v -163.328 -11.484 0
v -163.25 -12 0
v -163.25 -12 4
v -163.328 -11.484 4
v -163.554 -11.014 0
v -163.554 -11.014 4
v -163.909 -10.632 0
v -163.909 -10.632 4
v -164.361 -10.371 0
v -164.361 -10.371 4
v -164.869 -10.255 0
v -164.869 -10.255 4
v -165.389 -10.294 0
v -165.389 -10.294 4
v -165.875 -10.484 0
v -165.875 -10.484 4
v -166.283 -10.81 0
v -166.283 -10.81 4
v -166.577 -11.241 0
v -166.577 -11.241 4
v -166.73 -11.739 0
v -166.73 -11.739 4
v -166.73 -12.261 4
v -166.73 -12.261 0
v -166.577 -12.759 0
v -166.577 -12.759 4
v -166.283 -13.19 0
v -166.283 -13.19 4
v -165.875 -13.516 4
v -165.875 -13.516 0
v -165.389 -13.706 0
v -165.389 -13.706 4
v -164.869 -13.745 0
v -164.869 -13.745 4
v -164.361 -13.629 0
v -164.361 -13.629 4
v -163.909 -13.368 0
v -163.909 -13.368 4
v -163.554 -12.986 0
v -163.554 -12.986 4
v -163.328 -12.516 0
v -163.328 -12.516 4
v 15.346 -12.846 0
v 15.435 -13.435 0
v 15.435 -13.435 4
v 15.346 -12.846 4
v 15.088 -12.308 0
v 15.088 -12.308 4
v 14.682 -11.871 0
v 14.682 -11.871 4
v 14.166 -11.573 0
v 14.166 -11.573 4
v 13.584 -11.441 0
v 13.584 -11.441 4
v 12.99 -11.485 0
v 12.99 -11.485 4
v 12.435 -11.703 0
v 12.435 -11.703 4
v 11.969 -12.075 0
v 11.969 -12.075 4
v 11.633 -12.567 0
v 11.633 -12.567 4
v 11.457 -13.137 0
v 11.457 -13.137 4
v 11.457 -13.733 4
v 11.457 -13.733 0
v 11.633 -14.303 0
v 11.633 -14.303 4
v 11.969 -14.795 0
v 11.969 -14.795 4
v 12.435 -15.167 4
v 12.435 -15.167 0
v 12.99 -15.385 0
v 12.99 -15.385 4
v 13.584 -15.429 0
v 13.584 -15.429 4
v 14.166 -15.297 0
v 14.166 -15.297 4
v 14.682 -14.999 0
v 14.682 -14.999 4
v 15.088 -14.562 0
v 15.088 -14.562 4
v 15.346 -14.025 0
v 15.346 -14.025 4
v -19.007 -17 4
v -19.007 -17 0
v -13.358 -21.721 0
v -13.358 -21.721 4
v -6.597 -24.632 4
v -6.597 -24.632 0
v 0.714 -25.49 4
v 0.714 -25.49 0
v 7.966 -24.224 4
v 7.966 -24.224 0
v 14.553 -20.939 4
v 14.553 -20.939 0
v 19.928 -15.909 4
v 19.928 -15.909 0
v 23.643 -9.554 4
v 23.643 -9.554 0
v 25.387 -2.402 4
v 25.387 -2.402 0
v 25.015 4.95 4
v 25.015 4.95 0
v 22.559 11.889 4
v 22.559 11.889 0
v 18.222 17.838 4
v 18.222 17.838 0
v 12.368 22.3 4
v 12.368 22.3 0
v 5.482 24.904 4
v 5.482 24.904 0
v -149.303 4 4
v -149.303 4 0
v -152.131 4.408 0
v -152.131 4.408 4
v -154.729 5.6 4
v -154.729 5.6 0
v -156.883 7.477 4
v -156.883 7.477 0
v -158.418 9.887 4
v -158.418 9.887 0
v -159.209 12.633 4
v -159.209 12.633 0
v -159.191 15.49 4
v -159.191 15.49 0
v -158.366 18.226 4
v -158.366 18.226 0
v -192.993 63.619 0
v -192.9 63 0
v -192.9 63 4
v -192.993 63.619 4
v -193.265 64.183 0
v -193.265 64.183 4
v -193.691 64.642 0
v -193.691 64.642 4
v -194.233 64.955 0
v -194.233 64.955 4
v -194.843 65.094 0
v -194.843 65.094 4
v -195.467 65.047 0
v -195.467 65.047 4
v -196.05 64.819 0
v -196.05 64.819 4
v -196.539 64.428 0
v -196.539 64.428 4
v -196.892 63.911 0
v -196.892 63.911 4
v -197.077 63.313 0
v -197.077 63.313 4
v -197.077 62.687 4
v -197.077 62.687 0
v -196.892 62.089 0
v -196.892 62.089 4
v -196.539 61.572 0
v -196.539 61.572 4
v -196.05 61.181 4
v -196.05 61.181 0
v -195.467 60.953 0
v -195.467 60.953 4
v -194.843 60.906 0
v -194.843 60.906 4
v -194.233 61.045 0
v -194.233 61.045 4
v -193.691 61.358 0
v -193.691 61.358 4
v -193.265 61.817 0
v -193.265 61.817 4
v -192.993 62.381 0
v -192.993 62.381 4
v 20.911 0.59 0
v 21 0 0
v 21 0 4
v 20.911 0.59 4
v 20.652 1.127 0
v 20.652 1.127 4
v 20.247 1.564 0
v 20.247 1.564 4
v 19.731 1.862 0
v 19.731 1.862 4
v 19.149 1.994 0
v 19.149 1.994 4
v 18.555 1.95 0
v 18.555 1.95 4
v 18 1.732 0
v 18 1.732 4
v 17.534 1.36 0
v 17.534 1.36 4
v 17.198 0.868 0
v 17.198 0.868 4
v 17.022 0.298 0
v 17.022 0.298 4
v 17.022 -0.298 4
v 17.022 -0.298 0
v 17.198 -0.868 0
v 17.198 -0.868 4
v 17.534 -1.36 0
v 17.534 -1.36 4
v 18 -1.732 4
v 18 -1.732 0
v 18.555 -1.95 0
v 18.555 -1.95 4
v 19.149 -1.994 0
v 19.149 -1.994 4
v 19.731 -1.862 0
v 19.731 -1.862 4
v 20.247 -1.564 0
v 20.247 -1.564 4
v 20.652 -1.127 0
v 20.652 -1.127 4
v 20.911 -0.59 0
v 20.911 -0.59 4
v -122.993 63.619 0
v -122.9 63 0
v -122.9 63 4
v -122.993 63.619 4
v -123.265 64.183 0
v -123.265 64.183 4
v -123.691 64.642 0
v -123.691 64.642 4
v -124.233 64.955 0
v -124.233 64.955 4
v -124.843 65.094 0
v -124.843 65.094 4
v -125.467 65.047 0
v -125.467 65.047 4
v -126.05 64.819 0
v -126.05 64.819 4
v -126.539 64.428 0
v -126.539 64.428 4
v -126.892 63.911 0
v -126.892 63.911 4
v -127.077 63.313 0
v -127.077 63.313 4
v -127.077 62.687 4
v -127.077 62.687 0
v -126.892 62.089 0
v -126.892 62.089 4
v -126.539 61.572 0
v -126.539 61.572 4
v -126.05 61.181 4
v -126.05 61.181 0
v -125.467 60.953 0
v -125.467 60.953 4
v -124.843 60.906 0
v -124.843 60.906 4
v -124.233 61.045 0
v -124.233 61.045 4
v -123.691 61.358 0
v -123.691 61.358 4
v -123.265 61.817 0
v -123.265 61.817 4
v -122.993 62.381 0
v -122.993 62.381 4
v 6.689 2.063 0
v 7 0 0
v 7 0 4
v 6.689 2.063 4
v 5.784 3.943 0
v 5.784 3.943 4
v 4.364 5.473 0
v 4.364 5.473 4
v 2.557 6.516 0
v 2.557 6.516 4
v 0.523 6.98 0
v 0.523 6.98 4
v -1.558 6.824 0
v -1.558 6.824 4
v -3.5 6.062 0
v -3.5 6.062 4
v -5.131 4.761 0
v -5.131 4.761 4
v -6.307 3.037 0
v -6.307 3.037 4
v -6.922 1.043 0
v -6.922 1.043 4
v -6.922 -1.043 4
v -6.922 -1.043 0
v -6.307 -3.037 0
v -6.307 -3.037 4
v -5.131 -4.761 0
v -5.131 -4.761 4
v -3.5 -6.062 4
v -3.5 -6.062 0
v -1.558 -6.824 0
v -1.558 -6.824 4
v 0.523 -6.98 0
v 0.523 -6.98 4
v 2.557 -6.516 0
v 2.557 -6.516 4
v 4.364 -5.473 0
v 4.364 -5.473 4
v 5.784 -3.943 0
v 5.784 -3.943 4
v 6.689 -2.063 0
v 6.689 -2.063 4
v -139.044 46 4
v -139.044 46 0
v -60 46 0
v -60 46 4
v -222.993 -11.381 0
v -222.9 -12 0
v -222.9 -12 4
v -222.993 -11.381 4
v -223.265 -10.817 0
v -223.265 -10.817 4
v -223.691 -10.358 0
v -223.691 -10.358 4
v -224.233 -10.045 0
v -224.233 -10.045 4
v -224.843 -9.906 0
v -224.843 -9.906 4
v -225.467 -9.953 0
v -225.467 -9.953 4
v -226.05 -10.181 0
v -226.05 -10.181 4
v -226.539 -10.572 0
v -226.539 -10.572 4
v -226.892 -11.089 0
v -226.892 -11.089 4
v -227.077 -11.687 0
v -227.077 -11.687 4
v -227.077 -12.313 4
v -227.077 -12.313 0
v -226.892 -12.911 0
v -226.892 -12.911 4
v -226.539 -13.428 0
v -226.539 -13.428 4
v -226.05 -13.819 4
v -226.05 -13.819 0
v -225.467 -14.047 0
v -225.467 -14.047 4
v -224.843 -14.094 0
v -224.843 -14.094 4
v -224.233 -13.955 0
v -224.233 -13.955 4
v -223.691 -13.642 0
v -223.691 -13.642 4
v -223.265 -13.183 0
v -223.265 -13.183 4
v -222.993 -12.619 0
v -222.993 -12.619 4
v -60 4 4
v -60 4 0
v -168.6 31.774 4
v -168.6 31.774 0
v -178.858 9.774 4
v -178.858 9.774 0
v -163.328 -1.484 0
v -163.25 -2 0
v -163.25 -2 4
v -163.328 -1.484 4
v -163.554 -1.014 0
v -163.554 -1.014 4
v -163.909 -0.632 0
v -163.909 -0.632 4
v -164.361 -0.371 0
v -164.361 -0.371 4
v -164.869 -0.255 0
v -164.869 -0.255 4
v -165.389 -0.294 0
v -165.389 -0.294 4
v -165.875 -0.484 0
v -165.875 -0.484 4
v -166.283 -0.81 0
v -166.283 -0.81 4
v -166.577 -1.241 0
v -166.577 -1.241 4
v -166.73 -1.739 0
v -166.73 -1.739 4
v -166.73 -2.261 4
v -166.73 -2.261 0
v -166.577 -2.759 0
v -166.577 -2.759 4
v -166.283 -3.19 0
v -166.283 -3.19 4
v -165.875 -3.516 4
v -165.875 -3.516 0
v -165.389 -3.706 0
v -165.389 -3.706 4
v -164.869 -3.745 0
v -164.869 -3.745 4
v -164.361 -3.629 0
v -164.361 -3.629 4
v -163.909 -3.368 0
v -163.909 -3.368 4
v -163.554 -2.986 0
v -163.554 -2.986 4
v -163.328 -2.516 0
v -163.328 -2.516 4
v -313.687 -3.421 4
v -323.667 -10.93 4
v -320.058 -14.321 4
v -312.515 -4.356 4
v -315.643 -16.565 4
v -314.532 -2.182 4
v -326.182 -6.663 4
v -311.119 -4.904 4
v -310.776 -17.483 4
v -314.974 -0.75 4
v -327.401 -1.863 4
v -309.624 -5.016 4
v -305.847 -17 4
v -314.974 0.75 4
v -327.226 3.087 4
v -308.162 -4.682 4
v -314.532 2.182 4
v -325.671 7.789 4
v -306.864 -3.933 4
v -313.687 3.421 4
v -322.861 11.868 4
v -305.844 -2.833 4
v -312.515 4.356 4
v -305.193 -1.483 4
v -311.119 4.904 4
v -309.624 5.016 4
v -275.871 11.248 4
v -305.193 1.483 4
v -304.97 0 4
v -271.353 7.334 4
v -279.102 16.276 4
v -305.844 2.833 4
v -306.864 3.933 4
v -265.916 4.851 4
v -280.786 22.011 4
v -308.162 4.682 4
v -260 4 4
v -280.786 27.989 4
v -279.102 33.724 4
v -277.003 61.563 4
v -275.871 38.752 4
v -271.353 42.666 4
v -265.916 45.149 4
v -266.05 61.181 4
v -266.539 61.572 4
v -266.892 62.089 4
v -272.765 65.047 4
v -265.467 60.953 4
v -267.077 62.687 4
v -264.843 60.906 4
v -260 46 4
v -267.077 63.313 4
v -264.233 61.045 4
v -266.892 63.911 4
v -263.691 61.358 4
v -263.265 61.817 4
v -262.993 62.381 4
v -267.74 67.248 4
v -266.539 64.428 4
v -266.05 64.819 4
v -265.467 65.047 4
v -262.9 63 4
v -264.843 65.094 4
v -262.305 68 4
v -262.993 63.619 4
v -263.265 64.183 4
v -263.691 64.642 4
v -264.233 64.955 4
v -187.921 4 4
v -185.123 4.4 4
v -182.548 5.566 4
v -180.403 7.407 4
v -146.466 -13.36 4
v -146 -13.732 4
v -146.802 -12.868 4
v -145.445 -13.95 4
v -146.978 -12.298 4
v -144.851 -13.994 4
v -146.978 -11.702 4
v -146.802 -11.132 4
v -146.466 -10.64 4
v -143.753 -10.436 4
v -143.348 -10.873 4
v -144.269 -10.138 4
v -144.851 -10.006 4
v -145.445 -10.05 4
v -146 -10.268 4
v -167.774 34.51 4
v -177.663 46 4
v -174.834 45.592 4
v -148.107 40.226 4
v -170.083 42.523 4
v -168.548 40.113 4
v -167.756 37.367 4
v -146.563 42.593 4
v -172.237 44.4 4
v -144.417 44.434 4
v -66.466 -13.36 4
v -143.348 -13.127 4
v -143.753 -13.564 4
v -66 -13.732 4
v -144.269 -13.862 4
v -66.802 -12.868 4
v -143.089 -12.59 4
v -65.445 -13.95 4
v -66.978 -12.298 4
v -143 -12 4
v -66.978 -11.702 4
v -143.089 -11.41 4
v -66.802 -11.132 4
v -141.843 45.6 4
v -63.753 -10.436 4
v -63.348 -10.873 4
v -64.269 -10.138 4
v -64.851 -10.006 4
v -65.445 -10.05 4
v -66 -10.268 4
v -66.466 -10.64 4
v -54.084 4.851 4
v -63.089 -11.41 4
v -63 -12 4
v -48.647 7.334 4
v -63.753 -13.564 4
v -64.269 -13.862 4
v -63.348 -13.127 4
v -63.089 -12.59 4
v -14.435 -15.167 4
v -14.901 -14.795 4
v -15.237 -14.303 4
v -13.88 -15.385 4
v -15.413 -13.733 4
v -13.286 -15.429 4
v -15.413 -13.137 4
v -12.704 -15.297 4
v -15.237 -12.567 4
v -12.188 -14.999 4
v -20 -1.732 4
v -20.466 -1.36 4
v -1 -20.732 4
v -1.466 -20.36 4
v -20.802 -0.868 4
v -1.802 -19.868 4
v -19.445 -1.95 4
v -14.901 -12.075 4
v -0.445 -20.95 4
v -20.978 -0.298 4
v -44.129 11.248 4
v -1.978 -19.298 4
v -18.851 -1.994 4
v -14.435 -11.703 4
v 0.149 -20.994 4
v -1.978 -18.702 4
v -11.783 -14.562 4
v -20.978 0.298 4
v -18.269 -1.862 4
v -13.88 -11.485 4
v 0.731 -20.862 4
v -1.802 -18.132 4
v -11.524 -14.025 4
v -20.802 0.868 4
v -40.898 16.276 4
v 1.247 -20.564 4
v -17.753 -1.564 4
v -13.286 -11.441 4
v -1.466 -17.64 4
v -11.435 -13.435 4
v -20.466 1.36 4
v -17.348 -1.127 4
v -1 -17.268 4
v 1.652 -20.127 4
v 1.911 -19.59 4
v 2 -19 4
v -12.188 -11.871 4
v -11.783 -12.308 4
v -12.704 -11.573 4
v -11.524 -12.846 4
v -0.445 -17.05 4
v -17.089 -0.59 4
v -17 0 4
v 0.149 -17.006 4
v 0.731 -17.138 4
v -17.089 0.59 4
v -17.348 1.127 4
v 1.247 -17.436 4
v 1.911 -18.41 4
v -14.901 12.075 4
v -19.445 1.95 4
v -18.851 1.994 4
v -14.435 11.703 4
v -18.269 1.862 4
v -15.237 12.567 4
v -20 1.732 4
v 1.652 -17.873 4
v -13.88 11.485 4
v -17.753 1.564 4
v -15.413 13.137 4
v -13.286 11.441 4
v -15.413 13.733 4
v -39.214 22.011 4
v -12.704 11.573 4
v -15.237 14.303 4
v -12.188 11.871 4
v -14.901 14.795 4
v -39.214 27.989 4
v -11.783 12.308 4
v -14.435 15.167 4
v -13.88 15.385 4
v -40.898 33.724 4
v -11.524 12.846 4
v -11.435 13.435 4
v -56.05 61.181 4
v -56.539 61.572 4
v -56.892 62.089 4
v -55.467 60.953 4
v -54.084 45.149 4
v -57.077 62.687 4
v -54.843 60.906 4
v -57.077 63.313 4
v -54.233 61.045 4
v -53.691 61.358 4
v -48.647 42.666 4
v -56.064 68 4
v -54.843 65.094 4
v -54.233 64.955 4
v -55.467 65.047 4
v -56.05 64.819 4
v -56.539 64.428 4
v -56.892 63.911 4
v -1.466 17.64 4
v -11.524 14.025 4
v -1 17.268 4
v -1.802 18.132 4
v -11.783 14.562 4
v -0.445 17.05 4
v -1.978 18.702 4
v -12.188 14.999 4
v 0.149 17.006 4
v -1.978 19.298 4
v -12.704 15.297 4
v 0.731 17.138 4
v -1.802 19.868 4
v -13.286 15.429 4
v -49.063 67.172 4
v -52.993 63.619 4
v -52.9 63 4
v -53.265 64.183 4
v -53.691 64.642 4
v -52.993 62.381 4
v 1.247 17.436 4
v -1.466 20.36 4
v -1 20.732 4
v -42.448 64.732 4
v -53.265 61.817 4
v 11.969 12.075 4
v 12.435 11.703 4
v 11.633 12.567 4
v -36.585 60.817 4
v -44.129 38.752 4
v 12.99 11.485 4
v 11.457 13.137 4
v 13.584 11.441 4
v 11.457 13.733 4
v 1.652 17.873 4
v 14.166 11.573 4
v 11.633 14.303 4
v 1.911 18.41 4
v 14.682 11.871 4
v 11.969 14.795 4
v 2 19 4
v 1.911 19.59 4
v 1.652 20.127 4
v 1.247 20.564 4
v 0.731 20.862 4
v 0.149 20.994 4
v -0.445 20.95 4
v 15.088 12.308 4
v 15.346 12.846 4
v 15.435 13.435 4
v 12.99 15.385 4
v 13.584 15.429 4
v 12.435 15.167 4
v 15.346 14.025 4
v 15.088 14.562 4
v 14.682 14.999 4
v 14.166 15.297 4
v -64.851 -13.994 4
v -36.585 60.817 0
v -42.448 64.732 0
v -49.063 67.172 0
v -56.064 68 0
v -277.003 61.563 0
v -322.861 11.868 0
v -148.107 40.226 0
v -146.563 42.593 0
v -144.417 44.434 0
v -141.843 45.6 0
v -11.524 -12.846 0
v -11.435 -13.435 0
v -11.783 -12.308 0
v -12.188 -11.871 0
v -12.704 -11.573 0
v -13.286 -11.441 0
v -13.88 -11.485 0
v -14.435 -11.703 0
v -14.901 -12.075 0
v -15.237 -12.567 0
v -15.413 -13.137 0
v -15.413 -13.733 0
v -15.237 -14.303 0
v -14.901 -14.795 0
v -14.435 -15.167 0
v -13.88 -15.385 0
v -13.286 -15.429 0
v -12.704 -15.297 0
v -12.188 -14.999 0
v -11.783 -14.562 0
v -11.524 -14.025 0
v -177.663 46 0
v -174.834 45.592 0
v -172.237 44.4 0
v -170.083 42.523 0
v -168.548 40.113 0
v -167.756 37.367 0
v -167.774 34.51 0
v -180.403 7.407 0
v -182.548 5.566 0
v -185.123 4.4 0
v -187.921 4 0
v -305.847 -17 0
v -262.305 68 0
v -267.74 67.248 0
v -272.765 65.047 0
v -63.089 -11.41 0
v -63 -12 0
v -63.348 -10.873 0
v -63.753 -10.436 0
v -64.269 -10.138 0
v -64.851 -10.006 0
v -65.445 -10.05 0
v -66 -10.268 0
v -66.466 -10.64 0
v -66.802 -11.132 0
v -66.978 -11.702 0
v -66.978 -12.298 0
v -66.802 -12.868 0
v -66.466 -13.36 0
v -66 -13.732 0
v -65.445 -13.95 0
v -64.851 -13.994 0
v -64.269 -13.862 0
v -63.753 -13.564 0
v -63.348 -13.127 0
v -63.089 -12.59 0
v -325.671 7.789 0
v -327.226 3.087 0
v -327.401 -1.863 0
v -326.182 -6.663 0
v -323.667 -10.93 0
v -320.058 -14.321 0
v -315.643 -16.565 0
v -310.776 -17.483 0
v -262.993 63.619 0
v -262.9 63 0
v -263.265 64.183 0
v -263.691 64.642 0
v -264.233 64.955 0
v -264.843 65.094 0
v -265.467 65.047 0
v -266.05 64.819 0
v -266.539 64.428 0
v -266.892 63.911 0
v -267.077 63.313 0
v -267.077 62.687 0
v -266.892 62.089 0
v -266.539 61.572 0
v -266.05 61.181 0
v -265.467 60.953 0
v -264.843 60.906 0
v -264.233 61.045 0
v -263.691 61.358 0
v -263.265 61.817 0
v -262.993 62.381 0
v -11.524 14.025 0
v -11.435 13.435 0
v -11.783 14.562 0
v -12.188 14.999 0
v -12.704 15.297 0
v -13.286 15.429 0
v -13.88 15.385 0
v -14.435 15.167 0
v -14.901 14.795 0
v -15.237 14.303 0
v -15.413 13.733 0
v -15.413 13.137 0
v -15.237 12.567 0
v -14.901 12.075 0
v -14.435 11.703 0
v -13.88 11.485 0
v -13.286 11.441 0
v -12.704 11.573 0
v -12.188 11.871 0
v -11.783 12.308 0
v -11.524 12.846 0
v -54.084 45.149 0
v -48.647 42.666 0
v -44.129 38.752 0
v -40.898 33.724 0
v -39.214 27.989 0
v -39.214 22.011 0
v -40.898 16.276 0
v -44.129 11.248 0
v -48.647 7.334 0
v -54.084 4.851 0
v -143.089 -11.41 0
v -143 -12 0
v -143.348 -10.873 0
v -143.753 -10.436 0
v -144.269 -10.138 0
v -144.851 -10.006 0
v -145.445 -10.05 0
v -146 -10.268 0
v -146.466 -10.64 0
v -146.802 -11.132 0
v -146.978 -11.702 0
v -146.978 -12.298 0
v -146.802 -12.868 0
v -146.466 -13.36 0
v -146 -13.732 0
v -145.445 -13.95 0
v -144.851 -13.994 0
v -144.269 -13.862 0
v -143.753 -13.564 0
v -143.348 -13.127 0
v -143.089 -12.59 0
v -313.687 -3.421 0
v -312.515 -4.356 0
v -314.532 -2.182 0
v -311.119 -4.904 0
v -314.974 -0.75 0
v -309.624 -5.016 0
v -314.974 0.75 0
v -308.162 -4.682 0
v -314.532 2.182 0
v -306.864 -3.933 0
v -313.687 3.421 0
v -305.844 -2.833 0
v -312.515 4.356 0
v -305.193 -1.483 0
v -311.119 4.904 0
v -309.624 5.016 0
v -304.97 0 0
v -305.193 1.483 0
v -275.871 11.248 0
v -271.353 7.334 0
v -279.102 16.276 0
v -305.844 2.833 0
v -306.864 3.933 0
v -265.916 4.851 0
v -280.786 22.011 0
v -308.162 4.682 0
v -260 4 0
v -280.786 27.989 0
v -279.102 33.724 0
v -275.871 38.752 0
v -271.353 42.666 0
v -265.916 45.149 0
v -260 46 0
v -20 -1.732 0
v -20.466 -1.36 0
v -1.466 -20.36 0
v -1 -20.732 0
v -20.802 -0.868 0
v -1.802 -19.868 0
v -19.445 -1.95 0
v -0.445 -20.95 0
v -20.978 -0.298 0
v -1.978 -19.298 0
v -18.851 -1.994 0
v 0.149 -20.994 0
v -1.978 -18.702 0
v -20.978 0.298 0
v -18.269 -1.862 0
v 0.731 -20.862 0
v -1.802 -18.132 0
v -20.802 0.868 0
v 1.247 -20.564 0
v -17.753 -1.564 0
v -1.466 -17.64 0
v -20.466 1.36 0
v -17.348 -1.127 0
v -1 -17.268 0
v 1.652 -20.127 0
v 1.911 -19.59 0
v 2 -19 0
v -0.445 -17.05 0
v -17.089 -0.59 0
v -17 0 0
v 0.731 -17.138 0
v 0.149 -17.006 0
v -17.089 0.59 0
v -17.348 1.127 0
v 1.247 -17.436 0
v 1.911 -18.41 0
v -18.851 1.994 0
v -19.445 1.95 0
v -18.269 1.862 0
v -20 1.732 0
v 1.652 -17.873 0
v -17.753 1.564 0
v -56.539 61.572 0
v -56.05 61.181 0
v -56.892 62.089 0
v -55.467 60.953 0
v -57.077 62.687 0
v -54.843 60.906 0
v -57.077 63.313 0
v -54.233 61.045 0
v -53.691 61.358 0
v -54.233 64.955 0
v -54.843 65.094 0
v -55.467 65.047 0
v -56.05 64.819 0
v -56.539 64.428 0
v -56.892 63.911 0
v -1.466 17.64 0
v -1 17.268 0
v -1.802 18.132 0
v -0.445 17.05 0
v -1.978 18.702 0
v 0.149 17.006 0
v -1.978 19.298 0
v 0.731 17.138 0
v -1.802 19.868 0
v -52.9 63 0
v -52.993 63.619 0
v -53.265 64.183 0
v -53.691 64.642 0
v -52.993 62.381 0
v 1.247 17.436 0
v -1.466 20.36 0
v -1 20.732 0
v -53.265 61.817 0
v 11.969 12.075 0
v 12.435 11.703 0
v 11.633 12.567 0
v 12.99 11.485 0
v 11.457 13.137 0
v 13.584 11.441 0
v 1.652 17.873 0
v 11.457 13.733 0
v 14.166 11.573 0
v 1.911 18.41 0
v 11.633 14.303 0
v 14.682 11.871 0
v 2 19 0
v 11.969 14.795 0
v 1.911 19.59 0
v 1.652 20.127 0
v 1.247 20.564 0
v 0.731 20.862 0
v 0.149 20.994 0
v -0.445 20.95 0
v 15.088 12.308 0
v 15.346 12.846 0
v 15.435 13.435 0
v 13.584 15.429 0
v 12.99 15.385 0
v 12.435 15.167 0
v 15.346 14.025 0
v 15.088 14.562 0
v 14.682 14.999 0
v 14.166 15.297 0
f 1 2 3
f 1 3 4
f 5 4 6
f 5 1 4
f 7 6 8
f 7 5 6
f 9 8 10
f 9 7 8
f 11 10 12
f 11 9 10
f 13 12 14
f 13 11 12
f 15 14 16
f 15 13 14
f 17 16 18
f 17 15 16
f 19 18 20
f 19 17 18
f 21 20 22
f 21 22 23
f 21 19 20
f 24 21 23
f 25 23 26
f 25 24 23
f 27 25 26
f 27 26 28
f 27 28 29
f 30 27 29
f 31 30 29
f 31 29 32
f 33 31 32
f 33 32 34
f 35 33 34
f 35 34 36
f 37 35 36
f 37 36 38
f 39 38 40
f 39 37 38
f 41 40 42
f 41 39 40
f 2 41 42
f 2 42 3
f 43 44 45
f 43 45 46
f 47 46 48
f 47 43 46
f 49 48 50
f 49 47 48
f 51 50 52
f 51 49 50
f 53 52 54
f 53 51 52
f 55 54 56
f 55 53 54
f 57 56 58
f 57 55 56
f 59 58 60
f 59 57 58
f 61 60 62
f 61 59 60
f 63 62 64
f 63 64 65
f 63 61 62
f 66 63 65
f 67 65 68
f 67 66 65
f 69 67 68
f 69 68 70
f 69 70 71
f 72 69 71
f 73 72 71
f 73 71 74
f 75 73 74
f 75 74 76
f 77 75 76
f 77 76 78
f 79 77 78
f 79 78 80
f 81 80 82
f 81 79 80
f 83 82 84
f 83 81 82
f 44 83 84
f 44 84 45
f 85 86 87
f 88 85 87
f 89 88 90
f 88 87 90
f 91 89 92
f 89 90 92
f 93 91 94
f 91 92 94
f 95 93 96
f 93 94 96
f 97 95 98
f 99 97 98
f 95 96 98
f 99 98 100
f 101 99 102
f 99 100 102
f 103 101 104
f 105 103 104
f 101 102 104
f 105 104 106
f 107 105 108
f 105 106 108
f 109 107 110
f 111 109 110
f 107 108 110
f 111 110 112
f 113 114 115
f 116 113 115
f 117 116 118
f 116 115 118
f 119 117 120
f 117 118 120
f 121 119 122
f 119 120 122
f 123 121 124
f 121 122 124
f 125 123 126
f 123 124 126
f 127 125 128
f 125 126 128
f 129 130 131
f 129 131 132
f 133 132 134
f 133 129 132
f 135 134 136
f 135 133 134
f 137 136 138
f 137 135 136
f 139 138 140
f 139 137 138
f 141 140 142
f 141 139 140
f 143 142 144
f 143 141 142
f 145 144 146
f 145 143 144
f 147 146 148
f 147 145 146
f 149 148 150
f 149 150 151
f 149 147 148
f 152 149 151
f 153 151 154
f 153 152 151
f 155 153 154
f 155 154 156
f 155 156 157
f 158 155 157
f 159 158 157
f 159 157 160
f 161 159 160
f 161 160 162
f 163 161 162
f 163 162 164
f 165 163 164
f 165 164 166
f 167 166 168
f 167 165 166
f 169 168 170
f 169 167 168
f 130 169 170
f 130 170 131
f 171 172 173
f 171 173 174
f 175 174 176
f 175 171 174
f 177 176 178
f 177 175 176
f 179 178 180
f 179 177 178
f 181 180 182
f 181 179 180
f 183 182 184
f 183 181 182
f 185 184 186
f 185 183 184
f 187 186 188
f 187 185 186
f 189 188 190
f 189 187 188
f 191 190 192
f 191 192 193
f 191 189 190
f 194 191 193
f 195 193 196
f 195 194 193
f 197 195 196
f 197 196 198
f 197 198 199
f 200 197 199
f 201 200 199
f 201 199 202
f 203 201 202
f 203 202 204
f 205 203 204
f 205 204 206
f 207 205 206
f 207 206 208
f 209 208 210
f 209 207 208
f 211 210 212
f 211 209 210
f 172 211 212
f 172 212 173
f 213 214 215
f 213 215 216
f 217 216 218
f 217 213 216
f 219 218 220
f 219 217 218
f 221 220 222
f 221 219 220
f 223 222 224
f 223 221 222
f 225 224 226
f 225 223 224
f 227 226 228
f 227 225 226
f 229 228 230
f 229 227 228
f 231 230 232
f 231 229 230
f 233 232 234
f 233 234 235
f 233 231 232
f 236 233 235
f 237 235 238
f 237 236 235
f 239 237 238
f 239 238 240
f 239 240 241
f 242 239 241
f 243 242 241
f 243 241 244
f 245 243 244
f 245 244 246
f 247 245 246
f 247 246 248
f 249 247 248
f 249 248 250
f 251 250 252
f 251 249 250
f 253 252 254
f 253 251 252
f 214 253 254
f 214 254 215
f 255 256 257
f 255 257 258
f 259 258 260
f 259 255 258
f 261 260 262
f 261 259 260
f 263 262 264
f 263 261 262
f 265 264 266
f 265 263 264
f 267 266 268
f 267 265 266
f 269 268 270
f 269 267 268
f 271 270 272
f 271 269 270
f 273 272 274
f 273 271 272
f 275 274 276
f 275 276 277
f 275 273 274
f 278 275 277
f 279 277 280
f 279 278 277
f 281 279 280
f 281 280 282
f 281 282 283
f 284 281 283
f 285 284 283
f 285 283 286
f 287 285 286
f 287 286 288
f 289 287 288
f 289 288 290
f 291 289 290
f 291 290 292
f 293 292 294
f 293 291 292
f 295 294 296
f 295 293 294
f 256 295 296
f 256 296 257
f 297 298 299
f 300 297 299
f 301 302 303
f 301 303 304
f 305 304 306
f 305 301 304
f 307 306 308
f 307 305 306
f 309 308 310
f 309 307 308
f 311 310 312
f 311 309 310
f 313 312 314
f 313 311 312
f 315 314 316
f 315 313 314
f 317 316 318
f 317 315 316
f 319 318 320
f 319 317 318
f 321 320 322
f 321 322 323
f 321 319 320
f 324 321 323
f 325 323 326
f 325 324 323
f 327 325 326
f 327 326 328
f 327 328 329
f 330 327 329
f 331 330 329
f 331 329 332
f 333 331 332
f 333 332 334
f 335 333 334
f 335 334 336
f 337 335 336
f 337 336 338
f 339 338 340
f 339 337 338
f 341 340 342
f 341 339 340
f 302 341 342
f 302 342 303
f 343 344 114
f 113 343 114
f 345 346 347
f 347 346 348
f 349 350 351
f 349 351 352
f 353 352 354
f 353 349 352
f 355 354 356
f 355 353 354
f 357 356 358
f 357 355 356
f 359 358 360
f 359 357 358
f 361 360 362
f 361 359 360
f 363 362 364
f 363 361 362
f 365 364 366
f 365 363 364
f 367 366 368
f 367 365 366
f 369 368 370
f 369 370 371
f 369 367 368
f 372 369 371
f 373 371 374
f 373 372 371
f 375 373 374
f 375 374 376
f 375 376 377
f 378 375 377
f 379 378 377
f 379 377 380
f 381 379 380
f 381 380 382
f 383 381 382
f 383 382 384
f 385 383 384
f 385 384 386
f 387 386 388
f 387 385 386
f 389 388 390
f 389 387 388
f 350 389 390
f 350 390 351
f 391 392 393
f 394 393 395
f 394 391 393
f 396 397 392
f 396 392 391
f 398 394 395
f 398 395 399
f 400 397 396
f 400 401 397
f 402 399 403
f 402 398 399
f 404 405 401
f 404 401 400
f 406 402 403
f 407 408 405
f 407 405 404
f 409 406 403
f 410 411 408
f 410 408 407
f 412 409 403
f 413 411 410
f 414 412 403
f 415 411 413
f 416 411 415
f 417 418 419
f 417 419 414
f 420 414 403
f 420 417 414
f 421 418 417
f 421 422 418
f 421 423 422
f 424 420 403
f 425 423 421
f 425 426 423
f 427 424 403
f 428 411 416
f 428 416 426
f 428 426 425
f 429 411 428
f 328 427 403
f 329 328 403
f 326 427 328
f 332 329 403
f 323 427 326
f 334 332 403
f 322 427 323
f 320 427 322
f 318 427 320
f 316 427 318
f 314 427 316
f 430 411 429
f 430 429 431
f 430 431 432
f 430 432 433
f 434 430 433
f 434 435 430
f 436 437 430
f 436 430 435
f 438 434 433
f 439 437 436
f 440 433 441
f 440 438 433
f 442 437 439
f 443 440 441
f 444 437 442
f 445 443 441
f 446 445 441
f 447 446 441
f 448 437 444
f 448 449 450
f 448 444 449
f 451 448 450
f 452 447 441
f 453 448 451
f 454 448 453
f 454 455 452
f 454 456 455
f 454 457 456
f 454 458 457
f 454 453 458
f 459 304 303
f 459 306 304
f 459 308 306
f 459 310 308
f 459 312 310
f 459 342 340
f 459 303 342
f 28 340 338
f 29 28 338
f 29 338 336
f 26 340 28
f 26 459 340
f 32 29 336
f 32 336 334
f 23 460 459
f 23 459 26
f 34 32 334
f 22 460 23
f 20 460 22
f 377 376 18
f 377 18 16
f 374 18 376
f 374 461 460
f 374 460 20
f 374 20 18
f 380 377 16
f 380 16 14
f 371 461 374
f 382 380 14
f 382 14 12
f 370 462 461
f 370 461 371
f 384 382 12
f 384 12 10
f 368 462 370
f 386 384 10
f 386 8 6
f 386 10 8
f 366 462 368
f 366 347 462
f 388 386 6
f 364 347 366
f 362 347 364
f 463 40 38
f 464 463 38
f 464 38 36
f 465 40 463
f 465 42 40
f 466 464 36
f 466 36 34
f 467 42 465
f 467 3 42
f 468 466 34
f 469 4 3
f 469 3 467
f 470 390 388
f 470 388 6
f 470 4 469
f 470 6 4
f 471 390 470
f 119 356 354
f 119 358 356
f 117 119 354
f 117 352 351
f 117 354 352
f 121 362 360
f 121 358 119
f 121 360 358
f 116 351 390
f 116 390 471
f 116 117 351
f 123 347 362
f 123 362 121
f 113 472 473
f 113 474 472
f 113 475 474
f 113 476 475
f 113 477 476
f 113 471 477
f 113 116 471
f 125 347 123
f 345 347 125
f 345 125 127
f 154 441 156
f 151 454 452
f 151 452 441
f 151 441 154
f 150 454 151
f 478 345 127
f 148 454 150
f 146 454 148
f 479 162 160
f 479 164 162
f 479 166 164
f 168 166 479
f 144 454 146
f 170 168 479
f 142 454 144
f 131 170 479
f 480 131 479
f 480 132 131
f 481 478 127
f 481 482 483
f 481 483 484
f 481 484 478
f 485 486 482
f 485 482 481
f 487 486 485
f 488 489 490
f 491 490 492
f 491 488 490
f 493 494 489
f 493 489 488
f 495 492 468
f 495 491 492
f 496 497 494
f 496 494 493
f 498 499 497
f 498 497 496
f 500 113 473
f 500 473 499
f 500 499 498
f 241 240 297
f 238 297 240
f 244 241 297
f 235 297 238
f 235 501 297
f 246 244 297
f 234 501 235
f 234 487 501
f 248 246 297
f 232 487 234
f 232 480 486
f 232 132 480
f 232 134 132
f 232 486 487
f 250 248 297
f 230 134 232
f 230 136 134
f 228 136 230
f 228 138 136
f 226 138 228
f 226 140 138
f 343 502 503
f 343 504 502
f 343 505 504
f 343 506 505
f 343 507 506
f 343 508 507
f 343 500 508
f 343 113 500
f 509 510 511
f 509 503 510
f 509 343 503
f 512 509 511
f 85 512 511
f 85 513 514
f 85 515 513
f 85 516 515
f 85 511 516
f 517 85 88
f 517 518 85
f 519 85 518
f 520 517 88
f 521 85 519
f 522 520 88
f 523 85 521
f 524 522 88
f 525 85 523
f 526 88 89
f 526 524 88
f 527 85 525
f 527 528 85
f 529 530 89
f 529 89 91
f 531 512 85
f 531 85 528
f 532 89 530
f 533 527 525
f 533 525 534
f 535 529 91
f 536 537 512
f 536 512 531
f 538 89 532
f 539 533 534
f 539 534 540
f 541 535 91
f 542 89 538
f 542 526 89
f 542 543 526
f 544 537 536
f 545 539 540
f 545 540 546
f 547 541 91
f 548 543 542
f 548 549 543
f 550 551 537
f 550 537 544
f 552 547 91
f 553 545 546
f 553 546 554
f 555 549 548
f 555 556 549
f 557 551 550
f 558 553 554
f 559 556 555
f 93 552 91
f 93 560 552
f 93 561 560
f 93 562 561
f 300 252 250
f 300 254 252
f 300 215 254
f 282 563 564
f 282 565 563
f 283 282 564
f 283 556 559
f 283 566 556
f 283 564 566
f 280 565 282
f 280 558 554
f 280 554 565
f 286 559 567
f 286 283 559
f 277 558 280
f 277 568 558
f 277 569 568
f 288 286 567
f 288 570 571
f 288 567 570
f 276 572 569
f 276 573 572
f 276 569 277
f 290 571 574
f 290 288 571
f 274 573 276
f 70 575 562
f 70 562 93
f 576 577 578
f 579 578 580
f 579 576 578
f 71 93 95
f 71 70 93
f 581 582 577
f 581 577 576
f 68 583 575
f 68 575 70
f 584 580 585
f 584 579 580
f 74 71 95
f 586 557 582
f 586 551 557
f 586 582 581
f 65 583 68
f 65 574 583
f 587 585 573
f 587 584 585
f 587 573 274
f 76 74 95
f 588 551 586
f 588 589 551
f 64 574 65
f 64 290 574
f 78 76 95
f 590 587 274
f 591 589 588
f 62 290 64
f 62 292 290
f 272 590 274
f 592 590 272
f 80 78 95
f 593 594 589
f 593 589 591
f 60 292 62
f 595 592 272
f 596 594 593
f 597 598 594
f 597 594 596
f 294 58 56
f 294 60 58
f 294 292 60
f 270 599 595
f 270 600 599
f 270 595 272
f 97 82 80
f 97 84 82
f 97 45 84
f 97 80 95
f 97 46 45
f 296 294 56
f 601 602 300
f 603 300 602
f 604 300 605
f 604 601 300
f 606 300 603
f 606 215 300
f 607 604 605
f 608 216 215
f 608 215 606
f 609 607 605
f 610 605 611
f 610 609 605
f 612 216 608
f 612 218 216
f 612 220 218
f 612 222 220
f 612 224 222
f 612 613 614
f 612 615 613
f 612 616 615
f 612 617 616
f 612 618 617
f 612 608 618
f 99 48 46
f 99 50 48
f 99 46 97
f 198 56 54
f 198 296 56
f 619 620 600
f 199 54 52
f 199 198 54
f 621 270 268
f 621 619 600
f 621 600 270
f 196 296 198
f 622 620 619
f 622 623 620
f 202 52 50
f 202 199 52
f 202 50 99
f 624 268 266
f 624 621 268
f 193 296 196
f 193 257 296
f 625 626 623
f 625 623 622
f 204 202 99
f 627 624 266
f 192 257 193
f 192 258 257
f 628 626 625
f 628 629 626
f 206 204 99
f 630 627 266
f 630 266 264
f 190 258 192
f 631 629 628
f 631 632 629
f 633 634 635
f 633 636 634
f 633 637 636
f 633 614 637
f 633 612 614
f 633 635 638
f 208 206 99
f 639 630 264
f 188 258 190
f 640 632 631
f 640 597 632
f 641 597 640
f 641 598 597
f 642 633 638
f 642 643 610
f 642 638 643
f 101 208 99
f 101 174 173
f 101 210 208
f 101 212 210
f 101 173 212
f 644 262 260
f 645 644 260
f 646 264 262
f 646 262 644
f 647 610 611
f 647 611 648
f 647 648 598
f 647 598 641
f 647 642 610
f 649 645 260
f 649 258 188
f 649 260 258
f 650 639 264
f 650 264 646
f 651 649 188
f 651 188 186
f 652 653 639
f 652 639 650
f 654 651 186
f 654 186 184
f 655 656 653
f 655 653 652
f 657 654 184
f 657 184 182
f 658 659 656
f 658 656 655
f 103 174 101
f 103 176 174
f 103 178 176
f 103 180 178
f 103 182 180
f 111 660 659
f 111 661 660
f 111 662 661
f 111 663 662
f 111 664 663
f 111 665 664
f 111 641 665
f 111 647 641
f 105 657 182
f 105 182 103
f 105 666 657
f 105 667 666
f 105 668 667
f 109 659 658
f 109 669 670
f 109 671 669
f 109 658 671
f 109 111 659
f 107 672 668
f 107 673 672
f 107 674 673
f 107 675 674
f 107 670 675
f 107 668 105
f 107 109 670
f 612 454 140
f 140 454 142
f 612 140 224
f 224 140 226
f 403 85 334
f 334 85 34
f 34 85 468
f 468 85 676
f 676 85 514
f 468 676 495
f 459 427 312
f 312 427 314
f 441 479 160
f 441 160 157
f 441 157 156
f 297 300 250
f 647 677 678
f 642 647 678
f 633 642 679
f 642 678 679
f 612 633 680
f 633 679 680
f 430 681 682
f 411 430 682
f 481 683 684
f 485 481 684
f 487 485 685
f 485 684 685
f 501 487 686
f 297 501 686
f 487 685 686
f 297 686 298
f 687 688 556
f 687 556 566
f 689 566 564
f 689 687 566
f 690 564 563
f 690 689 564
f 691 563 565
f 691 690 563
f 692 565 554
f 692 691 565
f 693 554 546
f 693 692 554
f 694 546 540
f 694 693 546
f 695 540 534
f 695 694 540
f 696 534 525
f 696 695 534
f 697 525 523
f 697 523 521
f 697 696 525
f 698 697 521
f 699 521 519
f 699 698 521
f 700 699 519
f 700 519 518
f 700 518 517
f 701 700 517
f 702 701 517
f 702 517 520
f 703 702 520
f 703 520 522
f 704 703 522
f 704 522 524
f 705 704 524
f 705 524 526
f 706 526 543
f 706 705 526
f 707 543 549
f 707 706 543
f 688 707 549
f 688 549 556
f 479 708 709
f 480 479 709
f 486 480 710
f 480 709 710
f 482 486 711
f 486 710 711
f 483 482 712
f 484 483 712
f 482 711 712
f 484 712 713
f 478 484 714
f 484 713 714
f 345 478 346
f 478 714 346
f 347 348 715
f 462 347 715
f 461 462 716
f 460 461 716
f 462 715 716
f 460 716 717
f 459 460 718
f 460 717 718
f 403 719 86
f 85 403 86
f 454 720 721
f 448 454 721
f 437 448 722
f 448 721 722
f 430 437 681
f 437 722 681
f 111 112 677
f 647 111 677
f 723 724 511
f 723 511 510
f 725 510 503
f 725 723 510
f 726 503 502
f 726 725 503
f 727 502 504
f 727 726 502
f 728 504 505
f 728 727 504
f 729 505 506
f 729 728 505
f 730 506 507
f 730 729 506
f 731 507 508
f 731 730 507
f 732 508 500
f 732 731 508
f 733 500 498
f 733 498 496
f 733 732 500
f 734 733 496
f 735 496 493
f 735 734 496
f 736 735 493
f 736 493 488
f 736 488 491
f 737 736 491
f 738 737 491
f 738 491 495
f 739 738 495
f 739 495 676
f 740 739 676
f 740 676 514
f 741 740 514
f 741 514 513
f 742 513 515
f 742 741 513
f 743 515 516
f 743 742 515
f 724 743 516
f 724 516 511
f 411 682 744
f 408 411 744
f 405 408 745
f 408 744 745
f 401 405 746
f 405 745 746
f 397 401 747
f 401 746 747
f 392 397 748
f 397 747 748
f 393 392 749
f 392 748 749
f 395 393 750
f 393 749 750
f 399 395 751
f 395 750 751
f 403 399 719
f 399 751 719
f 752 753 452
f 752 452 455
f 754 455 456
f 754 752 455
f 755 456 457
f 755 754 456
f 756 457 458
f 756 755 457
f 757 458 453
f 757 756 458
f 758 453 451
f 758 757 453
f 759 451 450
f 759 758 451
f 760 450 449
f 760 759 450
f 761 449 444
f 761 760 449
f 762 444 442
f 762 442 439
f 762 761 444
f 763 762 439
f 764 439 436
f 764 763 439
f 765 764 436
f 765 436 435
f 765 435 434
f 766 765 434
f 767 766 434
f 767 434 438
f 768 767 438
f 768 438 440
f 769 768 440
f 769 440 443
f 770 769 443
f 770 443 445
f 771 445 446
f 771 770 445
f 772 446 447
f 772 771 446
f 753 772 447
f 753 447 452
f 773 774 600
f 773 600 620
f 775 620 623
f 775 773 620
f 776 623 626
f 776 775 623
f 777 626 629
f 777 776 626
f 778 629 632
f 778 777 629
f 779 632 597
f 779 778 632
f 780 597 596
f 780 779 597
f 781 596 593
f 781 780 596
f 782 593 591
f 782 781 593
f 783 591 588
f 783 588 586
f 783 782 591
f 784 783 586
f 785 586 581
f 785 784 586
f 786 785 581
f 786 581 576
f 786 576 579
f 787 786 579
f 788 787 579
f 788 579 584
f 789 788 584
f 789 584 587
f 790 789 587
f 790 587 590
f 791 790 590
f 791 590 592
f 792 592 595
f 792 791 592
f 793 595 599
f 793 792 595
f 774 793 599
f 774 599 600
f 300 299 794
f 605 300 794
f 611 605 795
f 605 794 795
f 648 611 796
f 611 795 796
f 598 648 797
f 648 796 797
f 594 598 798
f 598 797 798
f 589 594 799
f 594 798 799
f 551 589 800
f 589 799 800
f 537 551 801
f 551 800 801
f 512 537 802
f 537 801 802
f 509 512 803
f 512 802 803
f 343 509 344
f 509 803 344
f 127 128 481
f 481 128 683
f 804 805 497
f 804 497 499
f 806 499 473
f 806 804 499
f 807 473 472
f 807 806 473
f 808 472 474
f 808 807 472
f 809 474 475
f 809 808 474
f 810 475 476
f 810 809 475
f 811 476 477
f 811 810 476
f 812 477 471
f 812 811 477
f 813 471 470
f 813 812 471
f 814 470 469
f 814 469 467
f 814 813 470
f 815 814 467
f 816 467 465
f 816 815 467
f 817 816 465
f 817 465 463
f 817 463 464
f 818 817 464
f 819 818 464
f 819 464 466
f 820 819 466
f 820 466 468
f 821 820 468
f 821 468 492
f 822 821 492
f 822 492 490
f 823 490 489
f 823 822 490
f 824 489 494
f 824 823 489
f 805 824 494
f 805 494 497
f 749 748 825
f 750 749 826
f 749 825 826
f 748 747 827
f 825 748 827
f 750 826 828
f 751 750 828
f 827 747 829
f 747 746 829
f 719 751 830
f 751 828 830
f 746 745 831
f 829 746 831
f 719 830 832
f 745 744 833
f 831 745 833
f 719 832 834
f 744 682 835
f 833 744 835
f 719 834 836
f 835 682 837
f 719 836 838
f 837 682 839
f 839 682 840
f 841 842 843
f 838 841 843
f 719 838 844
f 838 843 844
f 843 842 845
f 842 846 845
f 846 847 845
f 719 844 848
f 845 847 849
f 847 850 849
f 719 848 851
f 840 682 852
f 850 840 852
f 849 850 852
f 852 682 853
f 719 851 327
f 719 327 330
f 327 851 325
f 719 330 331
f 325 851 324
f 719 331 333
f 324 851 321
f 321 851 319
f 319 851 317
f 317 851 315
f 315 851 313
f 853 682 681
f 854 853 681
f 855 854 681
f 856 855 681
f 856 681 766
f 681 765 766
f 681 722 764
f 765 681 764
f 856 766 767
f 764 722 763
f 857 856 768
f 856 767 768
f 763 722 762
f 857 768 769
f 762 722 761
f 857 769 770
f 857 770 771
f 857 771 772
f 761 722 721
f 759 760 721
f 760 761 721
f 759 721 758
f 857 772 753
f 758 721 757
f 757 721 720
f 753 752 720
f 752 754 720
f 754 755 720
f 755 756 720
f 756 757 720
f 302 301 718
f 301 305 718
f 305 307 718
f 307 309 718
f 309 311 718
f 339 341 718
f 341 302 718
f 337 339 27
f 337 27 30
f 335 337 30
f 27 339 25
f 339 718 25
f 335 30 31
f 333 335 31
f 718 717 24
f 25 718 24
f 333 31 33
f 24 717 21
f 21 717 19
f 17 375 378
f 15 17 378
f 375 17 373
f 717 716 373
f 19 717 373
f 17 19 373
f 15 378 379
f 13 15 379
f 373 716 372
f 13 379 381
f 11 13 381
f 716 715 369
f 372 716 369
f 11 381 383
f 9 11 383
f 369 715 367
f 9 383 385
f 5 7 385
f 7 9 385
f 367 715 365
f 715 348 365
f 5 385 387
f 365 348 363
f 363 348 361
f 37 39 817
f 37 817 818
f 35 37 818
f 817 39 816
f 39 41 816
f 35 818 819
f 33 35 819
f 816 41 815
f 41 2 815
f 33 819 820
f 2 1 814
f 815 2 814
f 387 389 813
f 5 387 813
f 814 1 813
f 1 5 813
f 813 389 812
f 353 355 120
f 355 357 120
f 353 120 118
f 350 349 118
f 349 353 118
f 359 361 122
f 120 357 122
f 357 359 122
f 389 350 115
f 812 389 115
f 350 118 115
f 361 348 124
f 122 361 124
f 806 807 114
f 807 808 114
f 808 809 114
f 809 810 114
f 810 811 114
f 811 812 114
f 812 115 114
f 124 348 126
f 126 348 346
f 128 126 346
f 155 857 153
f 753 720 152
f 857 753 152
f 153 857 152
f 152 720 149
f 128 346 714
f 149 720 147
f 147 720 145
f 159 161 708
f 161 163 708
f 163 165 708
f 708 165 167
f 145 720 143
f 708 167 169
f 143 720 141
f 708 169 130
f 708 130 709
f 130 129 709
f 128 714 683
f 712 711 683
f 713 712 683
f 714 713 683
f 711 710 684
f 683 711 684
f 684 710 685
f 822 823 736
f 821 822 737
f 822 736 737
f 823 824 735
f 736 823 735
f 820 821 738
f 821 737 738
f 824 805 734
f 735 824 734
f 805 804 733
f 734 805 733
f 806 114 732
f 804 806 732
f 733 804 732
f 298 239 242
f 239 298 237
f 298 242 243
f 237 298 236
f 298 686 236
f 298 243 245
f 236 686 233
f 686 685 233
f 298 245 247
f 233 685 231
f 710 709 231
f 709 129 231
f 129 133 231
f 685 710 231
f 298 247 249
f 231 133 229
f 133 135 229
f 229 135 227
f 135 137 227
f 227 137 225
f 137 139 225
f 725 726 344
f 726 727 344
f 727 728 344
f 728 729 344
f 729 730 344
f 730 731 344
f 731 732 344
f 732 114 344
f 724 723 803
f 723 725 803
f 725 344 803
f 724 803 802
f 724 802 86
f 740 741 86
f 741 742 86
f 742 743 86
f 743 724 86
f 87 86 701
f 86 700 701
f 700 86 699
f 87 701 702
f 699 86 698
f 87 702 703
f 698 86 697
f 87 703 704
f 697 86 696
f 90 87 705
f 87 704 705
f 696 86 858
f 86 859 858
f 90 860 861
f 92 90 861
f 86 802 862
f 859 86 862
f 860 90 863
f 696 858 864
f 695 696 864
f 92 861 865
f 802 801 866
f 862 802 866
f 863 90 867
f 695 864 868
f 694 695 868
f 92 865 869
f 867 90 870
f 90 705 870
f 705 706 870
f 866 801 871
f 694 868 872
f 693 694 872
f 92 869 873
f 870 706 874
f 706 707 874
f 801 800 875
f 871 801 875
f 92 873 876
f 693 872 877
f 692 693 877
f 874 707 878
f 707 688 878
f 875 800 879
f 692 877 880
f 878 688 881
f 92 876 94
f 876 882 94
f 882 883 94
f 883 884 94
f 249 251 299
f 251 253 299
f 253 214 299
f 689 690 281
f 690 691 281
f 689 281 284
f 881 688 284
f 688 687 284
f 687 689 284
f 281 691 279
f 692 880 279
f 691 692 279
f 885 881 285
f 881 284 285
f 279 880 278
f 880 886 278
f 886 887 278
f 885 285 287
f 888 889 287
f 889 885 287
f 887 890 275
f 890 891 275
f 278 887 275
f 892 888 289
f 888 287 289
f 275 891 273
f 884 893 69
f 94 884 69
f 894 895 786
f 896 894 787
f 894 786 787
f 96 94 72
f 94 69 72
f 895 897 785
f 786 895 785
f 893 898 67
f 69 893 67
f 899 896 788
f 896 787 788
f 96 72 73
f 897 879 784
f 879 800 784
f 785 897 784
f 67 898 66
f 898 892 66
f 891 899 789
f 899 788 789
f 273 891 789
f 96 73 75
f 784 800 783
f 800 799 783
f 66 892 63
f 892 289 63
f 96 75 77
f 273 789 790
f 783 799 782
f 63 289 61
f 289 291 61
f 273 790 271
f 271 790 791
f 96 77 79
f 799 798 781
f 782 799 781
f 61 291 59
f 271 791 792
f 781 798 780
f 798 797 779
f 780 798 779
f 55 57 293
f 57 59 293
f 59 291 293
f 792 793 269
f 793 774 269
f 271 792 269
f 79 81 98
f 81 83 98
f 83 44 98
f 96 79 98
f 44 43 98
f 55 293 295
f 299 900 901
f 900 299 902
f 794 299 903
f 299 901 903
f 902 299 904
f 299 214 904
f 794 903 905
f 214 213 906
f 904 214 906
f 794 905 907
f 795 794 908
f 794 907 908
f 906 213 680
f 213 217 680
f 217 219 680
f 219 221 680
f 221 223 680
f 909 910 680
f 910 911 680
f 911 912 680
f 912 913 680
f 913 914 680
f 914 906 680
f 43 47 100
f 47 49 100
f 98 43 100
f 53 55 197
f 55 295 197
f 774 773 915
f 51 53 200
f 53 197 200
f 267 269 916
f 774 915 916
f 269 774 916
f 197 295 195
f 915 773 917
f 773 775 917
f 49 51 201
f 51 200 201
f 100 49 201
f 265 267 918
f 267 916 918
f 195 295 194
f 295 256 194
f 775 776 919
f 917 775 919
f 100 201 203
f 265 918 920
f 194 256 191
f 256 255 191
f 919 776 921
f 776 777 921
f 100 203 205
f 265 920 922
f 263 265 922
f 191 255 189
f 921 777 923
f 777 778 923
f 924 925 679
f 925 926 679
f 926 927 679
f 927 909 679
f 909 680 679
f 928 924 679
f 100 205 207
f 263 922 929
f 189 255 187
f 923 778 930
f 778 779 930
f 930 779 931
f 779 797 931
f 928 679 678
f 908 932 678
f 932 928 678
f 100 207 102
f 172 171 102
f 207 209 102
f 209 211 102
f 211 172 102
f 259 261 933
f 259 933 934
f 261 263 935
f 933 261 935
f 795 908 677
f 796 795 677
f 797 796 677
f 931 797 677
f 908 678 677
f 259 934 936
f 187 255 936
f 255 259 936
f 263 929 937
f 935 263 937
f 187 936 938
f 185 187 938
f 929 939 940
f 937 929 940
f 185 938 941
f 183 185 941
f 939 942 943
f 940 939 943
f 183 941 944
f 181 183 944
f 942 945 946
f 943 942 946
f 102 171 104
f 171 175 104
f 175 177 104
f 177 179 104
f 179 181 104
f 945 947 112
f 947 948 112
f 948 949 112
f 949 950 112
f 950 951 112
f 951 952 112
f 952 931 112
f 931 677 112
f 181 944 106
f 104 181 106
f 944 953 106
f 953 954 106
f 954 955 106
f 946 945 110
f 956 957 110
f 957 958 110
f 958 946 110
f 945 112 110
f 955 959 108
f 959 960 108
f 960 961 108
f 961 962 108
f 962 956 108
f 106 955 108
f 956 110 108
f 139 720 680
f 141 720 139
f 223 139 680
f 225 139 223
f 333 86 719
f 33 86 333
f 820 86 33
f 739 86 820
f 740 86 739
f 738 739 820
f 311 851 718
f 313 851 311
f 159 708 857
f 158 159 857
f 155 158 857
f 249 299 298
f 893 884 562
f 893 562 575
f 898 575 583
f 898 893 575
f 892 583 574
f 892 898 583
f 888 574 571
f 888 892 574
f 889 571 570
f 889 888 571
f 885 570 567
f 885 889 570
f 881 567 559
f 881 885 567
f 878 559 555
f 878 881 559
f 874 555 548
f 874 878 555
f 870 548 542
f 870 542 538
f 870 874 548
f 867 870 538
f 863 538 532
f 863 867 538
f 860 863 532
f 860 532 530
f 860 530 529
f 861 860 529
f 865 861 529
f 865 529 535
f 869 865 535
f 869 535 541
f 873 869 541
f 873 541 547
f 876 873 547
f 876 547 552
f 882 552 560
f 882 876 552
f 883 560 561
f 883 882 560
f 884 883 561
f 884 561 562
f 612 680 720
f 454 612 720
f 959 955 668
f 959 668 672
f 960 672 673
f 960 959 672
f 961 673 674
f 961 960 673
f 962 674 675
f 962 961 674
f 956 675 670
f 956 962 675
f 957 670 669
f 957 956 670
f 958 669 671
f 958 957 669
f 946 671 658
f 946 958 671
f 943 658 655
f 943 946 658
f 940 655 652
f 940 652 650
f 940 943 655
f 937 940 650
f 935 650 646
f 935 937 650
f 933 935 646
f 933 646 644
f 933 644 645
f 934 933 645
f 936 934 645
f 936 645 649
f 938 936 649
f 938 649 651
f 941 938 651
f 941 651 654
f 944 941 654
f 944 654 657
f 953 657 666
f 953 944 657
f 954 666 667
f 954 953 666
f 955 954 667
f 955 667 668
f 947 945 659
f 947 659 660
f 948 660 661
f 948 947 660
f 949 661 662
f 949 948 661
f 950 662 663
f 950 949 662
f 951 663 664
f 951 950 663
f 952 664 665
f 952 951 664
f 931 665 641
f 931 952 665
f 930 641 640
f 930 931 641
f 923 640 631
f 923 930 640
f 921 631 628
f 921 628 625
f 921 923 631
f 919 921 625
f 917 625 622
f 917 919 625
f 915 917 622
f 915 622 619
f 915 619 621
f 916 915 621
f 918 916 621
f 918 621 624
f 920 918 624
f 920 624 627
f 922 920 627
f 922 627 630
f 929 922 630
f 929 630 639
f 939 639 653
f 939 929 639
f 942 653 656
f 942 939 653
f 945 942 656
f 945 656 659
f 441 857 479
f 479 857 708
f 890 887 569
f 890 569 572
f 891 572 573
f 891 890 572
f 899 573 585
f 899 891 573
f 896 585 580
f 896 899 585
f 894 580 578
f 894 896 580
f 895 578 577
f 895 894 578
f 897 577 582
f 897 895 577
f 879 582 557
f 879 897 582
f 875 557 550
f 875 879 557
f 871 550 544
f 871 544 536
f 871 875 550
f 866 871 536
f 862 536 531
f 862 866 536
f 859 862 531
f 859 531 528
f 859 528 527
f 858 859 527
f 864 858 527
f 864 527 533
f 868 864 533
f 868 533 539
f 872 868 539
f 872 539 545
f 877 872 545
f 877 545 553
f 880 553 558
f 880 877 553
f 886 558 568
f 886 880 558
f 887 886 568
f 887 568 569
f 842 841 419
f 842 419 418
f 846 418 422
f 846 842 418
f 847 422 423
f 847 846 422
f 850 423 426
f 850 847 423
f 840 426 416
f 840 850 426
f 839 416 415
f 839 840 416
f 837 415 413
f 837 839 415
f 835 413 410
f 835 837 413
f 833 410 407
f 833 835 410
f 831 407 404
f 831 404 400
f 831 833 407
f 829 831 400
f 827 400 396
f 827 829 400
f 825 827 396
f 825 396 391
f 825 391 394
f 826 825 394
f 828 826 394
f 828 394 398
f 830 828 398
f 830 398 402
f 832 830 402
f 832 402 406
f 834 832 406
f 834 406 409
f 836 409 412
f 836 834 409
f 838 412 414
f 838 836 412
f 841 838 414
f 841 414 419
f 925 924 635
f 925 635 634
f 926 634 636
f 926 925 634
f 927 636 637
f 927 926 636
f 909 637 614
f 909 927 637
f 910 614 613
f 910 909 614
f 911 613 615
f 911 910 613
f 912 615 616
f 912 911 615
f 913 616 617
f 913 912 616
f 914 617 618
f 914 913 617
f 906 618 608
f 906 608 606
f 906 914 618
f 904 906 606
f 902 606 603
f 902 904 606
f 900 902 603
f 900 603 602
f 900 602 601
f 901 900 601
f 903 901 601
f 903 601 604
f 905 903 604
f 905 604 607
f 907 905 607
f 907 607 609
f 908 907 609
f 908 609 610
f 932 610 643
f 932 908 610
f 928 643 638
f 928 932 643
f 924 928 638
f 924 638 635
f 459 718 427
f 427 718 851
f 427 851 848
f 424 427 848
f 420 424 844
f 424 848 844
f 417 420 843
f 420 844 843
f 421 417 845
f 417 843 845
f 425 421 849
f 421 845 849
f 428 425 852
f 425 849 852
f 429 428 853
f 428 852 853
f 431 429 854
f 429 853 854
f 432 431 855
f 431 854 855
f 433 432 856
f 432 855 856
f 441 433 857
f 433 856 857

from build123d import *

# Parameters (mm, degrees)
SKETCH_2_R      = 2.1
SKETCH_2_R_2    = 1.75
SKETCH_2_R_3    = 5.03
SKETCH_2_R_4    = 2
SKETCH_2_R_5    = 7
EXTRUDE_1_DEPTH = 4


with BuildPart() as part:
    # 草图2 → 凸台-拉伸1 (new body)
    with BuildSketch(Plane.XY):
        with BuildLine():
            Line((-56.063767215, 68), (-262.305181408, 68))
            ThreePointArc((-262.305181408, 68), (-270.328158767, 66.320257484), (-277.003482509, 61.56318343))
            Line((-277.003482509, 61.56318343), (-322.861013463, 11.867785501))
            ThreePointArc((-322.861013463, 11.867785501), (-325.076248752, -8.885759595), (-305.846688069, -17))
            Line((-305.846688069, -17), (-19.006577809, -17))
            ThreePointArc((-19.006577809, -17), (22.016096561, -12.86629287), (5.482131266, 24.903739414))
            Line((5.482131266, 24.903739414), (-36.585436121, 60.816542635))
            ThreePointArc((-36.585436121, 60.816542635), (-45.683407853, 66.146902841), (-56.063767215, 68))
        make_face()
        with Locations((-225, -12)):
            Circle(SKETCH_2_R, mode=Mode.SUBTRACT)
        with Locations((-165, -12)):
            Circle(SKETCH_2_R_2, mode=Mode.SUBTRACT)
        with Locations((-310, 0)):
            Circle(SKETCH_2_R_3, mode=Mode.SUBTRACT)
        with Locations((-165, -2)):
            Circle(SKETCH_2_R_2, mode=Mode.SUBTRACT)
        with Locations((-145, -12)):
            Circle(SKETCH_2_R_4, mode=Mode.SUBTRACT)
        with Locations((-65, -12)):
            Circle(SKETCH_2_R_4, mode=Mode.SUBTRACT)
        with Locations((0, -19)):
            Circle(SKETCH_2_R_4, mode=Mode.SUBTRACT)
        with Locations((-13.435028843, -13.435028843)):
            Circle(SKETCH_2_R_4, mode=Mode.SUBTRACT)
        with Locations((13.435028843, -13.435028843)):
            Circle(SKETCH_2_R_4, mode=Mode.SUBTRACT)
        with Locations((-19, 0)):
            Circle(SKETCH_2_R_4, mode=Mode.SUBTRACT)
        Circle(SKETCH_2_R_5, mode=Mode.SUBTRACT)
        with Locations((19, 0)):
            Circle(SKETCH_2_R_4, mode=Mode.SUBTRACT)
        with Locations((-13.435028843, 13.435028843)):
            Circle(SKETCH_2_R_4, mode=Mode.SUBTRACT)
        with Locations((13.435028843, 13.435028843)):
            Circle(SKETCH_2_R_4, mode=Mode.SUBTRACT)
        with Locations((0, 19)):
            Circle(SKETCH_2_R_4, mode=Mode.SUBTRACT)
        with BuildLine():
            Line((-168.599525043, 31.773817383), (-178.858293522, 9.773817383))
            ThreePointArc((-178.858293522, 9.773817383), (-182.548375309, 5.566085542), (-187.921371393, 4))
            Line((-187.921371393, 4), (-260, 4))
            ThreePointArc((-260, 4), (-281, 25), (-260, 46))
            Line((-260, 46), (-177.662602913, 46))
            ThreePointArc((-177.662602913, 46), (-169.228688455, 41.372996083), (-168.599525043, 31.773817383))
        make_face(mode=Mode.SUBTRACT)
        with Locations((-265, 63)):
            Circle(SKETCH_2_R, mode=Mode.SUBTRACT)
        with Locations((-195, 63)):
            Circle(SKETCH_2_R, mode=Mode.SUBTRACT)
        with BuildLine():
            Line((-60, 4), (-149.303144229, 4))
            ThreePointArc((-149.303144229, 4), (-157.737058687, 8.627003917), (-158.366222099, 18.226182617))
            Line((-158.366222099, 18.226182617), (-148.10745362, 40.226182617))
            ThreePointArc((-148.10745362, 40.226182617), (-144.417371833, 44.433914458), (-139.044375749, 46))
            Line((-139.044375749, 46), (-60, 46))
            ThreePointArc((-60, 46), (-39, 25), (-60, 4))
        make_face(mode=Mode.SUBTRACT)
        with Locations((-125, 63)):
            Circle(SKETCH_2_R, mode=Mode.SUBTRACT)
        with Locations((-55, 63)):
            Circle(SKETCH_2_R, mode=Mode.SUBTRACT)
    extrude(amount=EXTRUDE_1_DEPTH)


solid = part.part
